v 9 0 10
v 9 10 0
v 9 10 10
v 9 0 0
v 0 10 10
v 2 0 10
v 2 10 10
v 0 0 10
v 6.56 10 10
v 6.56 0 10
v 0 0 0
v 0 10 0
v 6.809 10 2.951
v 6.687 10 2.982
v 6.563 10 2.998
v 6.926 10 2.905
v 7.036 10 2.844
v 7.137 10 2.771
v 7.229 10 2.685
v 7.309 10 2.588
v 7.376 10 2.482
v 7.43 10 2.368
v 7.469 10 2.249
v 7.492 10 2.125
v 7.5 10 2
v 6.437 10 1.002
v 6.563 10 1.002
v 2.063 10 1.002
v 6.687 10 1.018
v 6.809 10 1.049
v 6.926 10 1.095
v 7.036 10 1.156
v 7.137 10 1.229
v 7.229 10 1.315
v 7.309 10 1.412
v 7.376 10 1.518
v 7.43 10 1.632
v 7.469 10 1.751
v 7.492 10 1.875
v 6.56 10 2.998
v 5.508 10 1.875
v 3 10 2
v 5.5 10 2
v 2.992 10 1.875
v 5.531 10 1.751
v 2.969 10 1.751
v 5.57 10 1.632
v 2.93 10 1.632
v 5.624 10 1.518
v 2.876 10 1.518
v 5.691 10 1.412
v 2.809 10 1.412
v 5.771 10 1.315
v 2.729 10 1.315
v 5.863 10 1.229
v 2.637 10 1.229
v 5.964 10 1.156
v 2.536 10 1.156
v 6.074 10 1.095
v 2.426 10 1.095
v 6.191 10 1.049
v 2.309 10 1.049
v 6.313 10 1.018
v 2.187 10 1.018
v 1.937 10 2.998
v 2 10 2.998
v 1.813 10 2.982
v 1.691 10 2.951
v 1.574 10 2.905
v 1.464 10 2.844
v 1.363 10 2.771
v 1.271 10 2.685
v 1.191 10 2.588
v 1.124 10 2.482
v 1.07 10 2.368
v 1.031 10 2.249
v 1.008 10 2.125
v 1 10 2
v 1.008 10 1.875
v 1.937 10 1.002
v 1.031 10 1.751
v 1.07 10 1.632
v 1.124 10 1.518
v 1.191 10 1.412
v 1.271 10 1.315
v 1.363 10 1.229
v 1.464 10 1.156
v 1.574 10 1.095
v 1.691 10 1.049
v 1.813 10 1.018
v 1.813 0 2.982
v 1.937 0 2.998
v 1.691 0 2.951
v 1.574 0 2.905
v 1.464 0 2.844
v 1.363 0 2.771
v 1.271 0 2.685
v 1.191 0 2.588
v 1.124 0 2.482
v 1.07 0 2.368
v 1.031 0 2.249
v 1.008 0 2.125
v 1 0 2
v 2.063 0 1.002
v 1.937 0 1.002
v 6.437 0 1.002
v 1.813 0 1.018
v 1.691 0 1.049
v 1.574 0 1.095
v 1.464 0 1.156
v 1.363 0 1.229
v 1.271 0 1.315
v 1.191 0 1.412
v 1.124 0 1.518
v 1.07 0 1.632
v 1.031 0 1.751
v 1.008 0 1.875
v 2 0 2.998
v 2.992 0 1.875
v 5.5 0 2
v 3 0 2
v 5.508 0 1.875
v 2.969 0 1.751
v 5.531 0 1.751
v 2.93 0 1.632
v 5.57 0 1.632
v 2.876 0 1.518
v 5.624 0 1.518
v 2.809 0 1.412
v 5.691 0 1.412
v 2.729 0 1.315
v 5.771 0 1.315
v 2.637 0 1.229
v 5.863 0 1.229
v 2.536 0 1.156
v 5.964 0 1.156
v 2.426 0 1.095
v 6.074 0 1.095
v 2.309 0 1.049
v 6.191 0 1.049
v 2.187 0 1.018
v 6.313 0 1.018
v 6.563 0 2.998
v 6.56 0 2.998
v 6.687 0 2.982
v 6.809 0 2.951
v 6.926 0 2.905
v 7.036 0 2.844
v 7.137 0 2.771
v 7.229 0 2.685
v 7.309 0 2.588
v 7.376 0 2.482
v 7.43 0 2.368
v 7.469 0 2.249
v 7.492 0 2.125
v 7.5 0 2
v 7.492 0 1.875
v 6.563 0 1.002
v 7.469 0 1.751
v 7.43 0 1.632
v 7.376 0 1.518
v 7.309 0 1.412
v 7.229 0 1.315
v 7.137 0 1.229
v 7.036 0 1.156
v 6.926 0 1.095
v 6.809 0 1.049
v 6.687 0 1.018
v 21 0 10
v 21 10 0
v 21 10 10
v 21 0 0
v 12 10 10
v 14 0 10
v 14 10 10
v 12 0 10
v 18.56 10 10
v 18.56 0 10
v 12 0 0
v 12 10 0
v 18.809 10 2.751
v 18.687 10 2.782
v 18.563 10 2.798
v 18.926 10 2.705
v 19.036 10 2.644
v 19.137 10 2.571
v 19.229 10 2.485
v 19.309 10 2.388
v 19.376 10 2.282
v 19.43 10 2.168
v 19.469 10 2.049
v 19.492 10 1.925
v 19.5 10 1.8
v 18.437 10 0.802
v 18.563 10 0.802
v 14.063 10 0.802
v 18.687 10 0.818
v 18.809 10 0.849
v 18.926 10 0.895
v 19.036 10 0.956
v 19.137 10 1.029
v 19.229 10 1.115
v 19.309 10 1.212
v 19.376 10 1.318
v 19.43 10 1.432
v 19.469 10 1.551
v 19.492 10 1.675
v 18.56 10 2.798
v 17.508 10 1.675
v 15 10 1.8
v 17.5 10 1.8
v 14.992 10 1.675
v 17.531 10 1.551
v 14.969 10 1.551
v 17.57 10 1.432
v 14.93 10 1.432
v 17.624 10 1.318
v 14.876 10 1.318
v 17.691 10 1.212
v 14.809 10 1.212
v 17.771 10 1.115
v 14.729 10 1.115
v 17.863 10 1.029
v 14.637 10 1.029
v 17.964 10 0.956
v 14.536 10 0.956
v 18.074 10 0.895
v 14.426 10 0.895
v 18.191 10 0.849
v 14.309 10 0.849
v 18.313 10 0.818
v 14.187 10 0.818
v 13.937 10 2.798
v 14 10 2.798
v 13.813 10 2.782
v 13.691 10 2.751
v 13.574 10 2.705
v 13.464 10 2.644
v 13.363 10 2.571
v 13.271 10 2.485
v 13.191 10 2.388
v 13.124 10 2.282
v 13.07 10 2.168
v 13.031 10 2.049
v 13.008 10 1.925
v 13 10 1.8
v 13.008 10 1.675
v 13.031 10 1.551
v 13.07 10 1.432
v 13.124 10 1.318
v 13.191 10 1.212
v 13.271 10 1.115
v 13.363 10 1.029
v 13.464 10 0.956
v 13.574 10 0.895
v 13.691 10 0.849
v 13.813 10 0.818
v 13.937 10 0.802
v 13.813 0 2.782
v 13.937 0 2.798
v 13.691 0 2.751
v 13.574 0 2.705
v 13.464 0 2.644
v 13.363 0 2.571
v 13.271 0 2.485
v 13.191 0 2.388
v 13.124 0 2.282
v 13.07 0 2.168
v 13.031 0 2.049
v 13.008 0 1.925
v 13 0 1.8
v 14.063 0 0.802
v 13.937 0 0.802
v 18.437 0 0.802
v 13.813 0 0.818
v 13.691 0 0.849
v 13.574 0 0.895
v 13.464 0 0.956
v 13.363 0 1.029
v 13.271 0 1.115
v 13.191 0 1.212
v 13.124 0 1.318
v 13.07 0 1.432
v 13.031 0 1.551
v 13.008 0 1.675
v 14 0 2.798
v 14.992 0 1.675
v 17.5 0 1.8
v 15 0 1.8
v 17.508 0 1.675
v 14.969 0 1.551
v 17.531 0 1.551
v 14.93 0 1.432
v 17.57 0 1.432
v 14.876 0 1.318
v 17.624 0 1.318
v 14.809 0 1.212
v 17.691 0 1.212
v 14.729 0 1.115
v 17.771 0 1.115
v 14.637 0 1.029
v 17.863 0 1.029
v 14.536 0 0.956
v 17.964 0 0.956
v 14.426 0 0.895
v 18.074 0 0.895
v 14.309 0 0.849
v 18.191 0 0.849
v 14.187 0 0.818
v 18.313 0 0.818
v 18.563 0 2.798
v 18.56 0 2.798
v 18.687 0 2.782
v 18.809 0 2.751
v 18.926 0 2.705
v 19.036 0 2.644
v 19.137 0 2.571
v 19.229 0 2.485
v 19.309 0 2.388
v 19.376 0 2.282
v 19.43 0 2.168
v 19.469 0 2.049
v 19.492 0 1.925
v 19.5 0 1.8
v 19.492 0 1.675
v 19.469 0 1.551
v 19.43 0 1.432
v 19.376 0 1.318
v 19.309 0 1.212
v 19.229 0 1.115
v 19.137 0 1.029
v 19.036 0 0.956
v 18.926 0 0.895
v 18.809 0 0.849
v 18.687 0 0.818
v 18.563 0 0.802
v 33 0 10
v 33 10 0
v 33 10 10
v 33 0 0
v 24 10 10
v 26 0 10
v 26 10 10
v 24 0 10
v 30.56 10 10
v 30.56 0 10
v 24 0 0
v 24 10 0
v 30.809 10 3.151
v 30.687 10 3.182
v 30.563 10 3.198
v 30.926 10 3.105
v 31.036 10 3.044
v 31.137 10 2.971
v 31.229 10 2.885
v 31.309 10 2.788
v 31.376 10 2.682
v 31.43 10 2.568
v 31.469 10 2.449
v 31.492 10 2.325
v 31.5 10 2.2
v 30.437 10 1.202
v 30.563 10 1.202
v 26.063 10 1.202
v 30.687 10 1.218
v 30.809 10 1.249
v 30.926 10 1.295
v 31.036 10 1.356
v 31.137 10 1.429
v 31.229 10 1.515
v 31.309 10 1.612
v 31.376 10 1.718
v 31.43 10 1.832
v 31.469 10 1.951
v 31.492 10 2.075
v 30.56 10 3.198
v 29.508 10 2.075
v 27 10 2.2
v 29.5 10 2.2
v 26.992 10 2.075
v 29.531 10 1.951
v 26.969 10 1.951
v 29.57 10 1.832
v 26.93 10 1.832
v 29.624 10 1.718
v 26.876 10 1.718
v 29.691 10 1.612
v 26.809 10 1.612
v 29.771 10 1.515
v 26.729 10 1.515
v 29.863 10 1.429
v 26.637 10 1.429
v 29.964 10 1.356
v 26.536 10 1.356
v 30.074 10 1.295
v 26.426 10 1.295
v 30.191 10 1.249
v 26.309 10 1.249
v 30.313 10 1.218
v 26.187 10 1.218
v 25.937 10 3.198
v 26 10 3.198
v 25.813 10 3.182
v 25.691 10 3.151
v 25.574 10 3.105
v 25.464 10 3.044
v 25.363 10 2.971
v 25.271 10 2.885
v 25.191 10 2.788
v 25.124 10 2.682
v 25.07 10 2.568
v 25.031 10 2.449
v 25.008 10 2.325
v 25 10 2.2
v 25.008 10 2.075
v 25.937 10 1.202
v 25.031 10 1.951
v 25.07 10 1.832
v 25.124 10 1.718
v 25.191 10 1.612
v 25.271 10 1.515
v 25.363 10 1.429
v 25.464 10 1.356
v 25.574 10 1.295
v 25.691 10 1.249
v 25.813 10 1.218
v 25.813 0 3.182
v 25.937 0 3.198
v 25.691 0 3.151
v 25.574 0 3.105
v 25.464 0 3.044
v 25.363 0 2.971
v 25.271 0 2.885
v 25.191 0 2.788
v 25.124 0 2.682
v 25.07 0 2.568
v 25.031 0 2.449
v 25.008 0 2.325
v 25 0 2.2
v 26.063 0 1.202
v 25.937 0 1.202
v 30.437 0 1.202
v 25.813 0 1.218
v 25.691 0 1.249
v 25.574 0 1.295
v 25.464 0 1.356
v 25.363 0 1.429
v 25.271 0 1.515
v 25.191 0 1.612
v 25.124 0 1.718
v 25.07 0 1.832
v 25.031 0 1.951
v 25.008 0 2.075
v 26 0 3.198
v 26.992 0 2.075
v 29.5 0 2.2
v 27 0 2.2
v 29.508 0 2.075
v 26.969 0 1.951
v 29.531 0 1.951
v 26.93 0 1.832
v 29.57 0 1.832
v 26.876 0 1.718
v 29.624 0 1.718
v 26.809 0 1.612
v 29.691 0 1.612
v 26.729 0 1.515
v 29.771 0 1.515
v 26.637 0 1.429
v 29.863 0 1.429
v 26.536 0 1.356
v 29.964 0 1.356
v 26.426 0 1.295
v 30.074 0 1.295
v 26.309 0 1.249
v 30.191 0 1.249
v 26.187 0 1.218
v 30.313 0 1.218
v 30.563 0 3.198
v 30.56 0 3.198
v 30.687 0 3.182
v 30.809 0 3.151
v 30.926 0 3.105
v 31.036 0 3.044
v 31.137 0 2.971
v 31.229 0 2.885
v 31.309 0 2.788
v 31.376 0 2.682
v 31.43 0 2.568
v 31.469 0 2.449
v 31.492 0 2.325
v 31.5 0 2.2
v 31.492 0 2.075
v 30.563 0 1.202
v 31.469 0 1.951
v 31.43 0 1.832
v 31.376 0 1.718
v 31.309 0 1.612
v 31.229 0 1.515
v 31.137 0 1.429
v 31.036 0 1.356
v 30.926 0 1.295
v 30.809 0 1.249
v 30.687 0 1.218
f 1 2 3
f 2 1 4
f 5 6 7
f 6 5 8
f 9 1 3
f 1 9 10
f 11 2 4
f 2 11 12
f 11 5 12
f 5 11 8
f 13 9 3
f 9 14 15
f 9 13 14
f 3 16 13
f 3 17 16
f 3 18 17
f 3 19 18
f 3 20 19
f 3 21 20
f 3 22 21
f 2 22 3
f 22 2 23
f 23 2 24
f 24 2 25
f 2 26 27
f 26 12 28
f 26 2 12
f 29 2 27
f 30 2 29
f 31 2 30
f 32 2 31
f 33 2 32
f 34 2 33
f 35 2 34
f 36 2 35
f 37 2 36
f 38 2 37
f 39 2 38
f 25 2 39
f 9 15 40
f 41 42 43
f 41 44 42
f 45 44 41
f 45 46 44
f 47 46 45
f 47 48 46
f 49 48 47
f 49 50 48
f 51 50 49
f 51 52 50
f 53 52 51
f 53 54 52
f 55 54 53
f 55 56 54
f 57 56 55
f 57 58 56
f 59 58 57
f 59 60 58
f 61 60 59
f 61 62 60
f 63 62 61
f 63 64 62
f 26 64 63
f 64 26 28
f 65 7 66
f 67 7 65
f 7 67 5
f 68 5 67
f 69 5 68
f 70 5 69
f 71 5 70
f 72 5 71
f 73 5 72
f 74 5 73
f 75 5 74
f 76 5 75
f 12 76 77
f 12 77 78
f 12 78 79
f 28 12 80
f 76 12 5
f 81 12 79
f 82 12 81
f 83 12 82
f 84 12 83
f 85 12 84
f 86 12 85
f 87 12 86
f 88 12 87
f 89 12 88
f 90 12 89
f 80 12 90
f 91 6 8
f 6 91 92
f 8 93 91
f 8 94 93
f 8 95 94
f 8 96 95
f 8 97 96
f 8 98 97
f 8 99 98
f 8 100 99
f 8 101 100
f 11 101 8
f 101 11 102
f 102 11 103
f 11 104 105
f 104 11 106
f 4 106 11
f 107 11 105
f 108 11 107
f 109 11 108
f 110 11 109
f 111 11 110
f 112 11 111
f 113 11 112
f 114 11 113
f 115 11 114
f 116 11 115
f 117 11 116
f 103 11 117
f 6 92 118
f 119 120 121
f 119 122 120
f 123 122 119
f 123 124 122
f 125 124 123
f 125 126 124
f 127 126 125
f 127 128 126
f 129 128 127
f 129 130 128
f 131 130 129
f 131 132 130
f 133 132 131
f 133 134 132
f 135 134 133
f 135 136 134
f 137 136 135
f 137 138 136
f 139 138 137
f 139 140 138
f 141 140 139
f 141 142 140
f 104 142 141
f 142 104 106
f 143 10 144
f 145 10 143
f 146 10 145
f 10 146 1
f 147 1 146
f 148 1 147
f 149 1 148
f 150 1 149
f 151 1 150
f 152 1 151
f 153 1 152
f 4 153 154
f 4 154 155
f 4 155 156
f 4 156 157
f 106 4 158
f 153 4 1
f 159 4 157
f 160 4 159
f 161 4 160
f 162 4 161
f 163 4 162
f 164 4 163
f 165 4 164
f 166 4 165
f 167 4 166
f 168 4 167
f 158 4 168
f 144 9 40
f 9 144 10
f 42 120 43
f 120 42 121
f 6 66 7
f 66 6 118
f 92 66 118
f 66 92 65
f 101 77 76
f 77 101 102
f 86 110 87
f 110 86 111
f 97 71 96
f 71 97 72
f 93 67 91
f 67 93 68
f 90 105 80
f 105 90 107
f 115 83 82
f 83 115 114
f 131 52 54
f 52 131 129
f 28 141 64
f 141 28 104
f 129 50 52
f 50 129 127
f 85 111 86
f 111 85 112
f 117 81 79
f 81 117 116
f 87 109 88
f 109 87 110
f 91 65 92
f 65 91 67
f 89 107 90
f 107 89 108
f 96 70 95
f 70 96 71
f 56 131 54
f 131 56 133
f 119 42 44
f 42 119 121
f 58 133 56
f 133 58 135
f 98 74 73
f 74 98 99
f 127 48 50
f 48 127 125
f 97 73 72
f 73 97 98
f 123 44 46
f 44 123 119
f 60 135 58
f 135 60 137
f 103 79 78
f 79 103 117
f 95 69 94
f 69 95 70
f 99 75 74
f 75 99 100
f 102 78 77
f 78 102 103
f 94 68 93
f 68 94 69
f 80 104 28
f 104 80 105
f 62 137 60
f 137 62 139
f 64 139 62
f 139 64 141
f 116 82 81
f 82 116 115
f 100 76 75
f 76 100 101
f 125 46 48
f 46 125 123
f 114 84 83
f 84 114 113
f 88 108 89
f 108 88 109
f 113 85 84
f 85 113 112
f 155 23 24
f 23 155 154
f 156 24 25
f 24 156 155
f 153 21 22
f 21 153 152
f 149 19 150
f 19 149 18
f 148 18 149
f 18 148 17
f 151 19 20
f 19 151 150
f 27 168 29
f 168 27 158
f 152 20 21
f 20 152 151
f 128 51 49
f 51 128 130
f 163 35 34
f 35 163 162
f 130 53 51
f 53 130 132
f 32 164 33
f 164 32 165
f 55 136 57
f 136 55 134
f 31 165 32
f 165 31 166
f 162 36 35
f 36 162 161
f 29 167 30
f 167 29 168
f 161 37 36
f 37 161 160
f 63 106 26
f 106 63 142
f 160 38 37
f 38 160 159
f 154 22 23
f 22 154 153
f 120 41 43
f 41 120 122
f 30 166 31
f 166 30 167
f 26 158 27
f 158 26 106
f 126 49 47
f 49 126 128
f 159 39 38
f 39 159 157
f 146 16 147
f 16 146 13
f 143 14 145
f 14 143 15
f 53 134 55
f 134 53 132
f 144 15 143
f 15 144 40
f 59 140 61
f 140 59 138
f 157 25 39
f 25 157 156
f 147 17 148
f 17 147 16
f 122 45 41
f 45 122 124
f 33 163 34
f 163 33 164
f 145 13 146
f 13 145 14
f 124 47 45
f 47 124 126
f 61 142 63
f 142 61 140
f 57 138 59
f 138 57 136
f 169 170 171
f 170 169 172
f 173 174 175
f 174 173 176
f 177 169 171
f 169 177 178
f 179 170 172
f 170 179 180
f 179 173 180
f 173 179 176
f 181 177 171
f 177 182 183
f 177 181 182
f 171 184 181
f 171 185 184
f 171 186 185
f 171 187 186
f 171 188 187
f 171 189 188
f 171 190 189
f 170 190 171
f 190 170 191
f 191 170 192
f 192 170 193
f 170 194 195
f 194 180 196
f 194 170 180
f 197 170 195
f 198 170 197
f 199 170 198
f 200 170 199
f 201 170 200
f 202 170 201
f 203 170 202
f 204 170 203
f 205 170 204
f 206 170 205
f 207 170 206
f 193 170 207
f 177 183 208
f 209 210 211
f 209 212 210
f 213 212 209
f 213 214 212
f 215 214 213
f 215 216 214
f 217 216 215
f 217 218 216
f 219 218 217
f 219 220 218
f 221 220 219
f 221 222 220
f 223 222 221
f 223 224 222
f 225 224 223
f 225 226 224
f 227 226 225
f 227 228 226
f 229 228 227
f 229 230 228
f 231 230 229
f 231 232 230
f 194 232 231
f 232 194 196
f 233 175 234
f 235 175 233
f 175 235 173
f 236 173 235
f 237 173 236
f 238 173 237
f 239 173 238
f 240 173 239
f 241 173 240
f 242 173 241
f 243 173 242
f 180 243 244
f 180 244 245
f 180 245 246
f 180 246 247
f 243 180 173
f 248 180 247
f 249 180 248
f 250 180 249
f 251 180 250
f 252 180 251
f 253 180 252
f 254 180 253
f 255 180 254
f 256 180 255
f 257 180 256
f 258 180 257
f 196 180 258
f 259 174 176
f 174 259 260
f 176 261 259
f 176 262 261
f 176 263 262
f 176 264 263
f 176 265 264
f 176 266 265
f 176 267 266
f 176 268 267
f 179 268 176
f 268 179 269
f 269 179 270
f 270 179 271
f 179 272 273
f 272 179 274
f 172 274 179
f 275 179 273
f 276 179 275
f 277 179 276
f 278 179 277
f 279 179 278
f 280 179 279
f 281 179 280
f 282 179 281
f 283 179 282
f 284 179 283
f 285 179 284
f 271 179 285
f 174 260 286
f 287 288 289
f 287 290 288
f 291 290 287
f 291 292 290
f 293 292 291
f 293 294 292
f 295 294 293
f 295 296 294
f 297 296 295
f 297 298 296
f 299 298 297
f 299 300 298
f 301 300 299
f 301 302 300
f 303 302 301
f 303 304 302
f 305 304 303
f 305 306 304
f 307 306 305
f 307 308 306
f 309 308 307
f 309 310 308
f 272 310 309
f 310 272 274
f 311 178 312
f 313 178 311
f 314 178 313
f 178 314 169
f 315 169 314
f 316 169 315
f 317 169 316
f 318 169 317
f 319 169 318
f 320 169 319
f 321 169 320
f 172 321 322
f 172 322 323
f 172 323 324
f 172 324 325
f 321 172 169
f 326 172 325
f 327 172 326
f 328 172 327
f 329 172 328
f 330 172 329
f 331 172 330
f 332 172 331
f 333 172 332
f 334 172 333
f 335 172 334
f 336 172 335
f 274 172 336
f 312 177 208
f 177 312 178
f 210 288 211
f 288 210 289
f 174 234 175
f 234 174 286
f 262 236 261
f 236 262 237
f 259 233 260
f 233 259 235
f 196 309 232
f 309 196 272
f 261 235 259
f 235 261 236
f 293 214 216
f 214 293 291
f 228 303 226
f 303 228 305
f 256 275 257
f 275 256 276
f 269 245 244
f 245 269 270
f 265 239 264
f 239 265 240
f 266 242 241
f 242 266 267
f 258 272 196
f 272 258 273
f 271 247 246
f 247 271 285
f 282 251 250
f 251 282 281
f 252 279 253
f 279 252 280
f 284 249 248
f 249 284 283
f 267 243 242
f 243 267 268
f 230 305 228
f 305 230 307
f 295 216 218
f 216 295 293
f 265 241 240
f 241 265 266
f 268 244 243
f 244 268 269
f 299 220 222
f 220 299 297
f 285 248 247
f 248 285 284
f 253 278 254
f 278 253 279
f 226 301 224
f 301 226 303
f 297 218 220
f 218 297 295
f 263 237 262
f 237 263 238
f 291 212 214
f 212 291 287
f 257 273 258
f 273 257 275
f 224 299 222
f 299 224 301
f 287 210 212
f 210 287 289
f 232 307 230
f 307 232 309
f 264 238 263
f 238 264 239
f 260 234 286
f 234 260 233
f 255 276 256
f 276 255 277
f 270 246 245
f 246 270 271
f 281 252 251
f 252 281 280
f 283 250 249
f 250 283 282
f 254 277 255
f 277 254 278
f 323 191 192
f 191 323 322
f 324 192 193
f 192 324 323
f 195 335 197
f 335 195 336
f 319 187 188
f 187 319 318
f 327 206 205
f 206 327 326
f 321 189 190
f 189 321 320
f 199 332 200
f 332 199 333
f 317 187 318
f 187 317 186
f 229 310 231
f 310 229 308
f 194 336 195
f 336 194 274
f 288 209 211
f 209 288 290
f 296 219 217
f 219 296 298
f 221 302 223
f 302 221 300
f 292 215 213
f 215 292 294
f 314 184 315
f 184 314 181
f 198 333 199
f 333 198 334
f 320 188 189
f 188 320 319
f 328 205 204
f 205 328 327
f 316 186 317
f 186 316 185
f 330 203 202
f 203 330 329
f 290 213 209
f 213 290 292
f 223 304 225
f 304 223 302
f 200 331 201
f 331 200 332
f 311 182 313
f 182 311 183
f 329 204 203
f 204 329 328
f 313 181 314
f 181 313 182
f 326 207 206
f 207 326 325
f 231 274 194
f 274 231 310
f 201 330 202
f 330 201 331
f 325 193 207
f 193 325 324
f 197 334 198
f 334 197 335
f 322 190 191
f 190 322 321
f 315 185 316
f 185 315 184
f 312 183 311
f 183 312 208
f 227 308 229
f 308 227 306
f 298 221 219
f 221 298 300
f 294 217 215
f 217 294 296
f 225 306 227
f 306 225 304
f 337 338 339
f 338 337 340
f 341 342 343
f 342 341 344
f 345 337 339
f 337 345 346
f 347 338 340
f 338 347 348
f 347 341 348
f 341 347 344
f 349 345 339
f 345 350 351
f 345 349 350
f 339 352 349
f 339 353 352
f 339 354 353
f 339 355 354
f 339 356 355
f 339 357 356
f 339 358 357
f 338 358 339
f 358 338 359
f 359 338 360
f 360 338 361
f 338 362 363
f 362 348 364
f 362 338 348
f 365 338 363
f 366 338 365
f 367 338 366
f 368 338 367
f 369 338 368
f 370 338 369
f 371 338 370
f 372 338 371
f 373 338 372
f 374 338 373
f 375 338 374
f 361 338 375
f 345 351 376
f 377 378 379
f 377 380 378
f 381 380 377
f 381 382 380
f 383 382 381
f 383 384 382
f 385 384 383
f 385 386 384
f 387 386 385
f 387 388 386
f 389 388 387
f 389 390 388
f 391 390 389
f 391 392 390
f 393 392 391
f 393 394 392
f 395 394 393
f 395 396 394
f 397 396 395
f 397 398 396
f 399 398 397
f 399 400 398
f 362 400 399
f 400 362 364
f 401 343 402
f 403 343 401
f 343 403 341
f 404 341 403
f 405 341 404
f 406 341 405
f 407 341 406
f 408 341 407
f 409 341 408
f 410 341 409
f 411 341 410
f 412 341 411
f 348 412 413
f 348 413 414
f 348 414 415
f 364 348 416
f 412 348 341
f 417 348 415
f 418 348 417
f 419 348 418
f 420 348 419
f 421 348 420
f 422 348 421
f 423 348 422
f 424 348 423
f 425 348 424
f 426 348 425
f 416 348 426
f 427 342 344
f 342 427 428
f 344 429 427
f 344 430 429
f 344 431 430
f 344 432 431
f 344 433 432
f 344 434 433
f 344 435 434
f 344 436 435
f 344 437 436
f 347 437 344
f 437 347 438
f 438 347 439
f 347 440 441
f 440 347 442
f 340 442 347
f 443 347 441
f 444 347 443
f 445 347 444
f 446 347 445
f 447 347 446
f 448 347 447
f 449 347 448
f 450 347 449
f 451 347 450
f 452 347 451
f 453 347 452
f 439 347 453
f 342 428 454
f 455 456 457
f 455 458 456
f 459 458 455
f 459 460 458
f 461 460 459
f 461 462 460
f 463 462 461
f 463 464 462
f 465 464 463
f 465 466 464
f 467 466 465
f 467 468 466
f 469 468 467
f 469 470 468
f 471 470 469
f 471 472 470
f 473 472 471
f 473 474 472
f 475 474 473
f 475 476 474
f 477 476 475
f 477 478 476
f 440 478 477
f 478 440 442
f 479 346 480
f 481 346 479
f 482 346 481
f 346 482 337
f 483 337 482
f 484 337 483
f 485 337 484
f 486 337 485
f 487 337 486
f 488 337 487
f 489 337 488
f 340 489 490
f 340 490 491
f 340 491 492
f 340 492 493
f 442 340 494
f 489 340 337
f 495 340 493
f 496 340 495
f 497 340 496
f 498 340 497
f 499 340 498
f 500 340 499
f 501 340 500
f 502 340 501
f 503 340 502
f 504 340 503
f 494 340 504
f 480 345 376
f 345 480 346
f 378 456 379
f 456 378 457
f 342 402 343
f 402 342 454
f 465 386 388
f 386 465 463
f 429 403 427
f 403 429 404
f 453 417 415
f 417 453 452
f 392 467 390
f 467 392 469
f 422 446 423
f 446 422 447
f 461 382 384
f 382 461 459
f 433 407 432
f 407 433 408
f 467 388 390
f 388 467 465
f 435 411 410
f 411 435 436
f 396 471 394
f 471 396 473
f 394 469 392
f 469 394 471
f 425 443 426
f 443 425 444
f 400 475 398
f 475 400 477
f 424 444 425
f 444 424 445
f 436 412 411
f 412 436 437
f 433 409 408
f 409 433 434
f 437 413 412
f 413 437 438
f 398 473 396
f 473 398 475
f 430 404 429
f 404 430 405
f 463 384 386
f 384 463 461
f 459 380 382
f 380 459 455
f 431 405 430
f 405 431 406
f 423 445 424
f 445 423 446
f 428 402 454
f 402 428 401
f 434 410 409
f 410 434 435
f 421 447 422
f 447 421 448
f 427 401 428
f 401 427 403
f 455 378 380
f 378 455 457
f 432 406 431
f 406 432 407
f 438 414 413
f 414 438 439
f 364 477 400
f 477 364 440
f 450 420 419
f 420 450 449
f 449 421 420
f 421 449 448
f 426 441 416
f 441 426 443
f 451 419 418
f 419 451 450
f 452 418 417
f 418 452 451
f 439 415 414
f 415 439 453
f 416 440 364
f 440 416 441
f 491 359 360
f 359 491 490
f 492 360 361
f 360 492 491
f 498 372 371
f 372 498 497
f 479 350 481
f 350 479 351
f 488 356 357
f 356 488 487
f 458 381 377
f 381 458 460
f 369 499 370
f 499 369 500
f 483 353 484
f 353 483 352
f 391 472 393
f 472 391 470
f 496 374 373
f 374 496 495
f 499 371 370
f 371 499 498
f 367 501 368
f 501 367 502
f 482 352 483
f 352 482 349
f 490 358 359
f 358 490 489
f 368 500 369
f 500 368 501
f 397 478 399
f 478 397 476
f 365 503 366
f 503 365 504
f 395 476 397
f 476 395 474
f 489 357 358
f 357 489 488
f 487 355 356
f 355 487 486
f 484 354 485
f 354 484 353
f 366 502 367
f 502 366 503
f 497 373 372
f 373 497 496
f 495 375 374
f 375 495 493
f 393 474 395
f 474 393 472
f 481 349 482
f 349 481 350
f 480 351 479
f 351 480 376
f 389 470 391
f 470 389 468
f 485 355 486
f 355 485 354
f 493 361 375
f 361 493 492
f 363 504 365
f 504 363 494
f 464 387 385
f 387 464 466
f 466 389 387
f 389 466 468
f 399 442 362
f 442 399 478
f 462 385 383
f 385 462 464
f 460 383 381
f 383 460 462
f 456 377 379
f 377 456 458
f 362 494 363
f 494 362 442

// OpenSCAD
//Switching from glass bed to stock bed requires adjusting the Z stop limit switch.  Adding this U-spacer can compensate for the glass thickness, and the Z switch does not have to move.
tk=2;  //glass thickness 2-4
increment=0.2; //making 3 U-spacers, thickness tk, tk+increment, and tk-increment. Pick the best fit.

module zstop(tk=2){
difference(){
translate([0,0,0])  cube([9,10,10]);
translate([2,-0,tk]) cube([4.56,20,50]);
translate([2,10,tk]) rotate([90,0,0]) cylinder(r=1,h=20,$fn=50);
translate([6.5,10,tk]) rotate([90,0,0]) cylinder(r=1,h=20,$fn=50);

}}




zstop(tk);

translate([12,0,0])zstop(tk-increment);
translate([24,0,0])zstop(tk+increment);
